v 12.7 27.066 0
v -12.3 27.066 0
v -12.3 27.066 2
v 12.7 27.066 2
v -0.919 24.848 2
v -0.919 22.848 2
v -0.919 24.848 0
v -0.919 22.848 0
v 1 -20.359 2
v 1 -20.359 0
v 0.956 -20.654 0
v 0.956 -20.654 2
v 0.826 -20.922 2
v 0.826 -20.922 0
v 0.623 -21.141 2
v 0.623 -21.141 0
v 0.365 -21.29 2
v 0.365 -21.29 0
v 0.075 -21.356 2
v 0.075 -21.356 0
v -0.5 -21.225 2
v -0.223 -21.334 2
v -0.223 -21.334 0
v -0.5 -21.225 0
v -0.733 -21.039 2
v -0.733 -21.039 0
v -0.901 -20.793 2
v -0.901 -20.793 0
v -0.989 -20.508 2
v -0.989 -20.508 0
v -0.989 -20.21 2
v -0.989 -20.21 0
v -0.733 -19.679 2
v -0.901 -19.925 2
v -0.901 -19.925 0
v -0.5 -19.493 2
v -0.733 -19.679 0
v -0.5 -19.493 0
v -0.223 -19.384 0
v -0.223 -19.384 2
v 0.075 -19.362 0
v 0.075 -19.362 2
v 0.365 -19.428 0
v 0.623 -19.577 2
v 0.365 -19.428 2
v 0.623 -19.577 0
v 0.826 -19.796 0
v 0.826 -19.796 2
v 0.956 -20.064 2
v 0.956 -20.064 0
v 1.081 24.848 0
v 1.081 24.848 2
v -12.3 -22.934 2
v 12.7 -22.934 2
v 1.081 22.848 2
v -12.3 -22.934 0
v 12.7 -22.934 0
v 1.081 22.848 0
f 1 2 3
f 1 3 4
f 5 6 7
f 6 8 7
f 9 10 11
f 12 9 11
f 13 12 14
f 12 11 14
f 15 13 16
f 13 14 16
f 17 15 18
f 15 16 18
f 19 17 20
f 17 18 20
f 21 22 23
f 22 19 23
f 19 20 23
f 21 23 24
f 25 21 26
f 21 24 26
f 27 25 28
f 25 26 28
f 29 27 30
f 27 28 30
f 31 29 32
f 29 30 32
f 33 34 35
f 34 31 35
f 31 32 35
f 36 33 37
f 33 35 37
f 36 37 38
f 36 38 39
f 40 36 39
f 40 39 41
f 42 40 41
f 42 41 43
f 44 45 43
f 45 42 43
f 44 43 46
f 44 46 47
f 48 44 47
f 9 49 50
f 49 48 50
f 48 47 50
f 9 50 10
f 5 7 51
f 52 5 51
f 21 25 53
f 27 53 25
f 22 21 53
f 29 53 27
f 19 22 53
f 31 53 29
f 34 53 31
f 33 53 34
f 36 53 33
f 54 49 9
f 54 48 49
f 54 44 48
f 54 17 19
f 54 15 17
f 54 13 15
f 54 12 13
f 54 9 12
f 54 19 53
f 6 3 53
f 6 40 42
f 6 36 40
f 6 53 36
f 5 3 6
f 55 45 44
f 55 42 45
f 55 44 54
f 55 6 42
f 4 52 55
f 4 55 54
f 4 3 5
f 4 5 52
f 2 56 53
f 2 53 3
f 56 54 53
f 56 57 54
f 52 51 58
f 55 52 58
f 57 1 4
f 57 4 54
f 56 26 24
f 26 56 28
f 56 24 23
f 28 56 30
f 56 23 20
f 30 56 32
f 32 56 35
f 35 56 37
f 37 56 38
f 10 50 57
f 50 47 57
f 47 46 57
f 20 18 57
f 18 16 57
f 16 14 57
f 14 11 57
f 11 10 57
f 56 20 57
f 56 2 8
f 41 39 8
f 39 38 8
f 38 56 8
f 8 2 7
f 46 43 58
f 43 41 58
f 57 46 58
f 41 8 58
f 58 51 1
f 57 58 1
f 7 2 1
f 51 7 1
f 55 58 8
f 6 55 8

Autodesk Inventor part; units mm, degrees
ref_plane "YZ Plane" through (0, 0, 0) normal (1, 0, 0) x (0, 1, 0)
ref_plane "XZ Plane" through (0, 0, 0) normal (0, 1, 0) x (-1, 0, 0)
ref_plane "XY Plane" through (0, 0, 0) normal (0, 0, 1) x (1, 0, 0)
sketch "Sketch1" plane through (0, 0, 0) normal (0, 0, 1) x (1, 0, 0)
  line L0 (-12.2998, 27.0657) -> (12.7002, 27.0657)
  line L1 (12.7002, 27.0657) -> (12.7002, -22.9343)
  line L2 (12.7002, -22.9343) -> (-12.2998, -22.9343)
  line L3 (-12.2998, -22.9343) -> (-12.2998, 27.0657)
  circle A0 centre (0, -20.3589) radius 1
  line L4 (-0.9186, 24.8477) -> (1.0814, 24.8477)
  line L5 (1.0814, 24.8477) -> (1.0814, 22.8477)
  line L6 (1.0814, 22.8477) -> (-0.9186, 22.8477)
  line L7 (-0.9186, 22.8477) -> (-0.9186, 24.8477)
  point P0 (0, 0)
  dimension "d0" = 25
  dimension "d1" = 50
  dimension "d2" = 2
  dimension "d3" = 2
  dimension "d4" = 2
extrude "Extrusion1" add sketch "Sketch1" along normal blind 2
properties part number "Lclamp1"
